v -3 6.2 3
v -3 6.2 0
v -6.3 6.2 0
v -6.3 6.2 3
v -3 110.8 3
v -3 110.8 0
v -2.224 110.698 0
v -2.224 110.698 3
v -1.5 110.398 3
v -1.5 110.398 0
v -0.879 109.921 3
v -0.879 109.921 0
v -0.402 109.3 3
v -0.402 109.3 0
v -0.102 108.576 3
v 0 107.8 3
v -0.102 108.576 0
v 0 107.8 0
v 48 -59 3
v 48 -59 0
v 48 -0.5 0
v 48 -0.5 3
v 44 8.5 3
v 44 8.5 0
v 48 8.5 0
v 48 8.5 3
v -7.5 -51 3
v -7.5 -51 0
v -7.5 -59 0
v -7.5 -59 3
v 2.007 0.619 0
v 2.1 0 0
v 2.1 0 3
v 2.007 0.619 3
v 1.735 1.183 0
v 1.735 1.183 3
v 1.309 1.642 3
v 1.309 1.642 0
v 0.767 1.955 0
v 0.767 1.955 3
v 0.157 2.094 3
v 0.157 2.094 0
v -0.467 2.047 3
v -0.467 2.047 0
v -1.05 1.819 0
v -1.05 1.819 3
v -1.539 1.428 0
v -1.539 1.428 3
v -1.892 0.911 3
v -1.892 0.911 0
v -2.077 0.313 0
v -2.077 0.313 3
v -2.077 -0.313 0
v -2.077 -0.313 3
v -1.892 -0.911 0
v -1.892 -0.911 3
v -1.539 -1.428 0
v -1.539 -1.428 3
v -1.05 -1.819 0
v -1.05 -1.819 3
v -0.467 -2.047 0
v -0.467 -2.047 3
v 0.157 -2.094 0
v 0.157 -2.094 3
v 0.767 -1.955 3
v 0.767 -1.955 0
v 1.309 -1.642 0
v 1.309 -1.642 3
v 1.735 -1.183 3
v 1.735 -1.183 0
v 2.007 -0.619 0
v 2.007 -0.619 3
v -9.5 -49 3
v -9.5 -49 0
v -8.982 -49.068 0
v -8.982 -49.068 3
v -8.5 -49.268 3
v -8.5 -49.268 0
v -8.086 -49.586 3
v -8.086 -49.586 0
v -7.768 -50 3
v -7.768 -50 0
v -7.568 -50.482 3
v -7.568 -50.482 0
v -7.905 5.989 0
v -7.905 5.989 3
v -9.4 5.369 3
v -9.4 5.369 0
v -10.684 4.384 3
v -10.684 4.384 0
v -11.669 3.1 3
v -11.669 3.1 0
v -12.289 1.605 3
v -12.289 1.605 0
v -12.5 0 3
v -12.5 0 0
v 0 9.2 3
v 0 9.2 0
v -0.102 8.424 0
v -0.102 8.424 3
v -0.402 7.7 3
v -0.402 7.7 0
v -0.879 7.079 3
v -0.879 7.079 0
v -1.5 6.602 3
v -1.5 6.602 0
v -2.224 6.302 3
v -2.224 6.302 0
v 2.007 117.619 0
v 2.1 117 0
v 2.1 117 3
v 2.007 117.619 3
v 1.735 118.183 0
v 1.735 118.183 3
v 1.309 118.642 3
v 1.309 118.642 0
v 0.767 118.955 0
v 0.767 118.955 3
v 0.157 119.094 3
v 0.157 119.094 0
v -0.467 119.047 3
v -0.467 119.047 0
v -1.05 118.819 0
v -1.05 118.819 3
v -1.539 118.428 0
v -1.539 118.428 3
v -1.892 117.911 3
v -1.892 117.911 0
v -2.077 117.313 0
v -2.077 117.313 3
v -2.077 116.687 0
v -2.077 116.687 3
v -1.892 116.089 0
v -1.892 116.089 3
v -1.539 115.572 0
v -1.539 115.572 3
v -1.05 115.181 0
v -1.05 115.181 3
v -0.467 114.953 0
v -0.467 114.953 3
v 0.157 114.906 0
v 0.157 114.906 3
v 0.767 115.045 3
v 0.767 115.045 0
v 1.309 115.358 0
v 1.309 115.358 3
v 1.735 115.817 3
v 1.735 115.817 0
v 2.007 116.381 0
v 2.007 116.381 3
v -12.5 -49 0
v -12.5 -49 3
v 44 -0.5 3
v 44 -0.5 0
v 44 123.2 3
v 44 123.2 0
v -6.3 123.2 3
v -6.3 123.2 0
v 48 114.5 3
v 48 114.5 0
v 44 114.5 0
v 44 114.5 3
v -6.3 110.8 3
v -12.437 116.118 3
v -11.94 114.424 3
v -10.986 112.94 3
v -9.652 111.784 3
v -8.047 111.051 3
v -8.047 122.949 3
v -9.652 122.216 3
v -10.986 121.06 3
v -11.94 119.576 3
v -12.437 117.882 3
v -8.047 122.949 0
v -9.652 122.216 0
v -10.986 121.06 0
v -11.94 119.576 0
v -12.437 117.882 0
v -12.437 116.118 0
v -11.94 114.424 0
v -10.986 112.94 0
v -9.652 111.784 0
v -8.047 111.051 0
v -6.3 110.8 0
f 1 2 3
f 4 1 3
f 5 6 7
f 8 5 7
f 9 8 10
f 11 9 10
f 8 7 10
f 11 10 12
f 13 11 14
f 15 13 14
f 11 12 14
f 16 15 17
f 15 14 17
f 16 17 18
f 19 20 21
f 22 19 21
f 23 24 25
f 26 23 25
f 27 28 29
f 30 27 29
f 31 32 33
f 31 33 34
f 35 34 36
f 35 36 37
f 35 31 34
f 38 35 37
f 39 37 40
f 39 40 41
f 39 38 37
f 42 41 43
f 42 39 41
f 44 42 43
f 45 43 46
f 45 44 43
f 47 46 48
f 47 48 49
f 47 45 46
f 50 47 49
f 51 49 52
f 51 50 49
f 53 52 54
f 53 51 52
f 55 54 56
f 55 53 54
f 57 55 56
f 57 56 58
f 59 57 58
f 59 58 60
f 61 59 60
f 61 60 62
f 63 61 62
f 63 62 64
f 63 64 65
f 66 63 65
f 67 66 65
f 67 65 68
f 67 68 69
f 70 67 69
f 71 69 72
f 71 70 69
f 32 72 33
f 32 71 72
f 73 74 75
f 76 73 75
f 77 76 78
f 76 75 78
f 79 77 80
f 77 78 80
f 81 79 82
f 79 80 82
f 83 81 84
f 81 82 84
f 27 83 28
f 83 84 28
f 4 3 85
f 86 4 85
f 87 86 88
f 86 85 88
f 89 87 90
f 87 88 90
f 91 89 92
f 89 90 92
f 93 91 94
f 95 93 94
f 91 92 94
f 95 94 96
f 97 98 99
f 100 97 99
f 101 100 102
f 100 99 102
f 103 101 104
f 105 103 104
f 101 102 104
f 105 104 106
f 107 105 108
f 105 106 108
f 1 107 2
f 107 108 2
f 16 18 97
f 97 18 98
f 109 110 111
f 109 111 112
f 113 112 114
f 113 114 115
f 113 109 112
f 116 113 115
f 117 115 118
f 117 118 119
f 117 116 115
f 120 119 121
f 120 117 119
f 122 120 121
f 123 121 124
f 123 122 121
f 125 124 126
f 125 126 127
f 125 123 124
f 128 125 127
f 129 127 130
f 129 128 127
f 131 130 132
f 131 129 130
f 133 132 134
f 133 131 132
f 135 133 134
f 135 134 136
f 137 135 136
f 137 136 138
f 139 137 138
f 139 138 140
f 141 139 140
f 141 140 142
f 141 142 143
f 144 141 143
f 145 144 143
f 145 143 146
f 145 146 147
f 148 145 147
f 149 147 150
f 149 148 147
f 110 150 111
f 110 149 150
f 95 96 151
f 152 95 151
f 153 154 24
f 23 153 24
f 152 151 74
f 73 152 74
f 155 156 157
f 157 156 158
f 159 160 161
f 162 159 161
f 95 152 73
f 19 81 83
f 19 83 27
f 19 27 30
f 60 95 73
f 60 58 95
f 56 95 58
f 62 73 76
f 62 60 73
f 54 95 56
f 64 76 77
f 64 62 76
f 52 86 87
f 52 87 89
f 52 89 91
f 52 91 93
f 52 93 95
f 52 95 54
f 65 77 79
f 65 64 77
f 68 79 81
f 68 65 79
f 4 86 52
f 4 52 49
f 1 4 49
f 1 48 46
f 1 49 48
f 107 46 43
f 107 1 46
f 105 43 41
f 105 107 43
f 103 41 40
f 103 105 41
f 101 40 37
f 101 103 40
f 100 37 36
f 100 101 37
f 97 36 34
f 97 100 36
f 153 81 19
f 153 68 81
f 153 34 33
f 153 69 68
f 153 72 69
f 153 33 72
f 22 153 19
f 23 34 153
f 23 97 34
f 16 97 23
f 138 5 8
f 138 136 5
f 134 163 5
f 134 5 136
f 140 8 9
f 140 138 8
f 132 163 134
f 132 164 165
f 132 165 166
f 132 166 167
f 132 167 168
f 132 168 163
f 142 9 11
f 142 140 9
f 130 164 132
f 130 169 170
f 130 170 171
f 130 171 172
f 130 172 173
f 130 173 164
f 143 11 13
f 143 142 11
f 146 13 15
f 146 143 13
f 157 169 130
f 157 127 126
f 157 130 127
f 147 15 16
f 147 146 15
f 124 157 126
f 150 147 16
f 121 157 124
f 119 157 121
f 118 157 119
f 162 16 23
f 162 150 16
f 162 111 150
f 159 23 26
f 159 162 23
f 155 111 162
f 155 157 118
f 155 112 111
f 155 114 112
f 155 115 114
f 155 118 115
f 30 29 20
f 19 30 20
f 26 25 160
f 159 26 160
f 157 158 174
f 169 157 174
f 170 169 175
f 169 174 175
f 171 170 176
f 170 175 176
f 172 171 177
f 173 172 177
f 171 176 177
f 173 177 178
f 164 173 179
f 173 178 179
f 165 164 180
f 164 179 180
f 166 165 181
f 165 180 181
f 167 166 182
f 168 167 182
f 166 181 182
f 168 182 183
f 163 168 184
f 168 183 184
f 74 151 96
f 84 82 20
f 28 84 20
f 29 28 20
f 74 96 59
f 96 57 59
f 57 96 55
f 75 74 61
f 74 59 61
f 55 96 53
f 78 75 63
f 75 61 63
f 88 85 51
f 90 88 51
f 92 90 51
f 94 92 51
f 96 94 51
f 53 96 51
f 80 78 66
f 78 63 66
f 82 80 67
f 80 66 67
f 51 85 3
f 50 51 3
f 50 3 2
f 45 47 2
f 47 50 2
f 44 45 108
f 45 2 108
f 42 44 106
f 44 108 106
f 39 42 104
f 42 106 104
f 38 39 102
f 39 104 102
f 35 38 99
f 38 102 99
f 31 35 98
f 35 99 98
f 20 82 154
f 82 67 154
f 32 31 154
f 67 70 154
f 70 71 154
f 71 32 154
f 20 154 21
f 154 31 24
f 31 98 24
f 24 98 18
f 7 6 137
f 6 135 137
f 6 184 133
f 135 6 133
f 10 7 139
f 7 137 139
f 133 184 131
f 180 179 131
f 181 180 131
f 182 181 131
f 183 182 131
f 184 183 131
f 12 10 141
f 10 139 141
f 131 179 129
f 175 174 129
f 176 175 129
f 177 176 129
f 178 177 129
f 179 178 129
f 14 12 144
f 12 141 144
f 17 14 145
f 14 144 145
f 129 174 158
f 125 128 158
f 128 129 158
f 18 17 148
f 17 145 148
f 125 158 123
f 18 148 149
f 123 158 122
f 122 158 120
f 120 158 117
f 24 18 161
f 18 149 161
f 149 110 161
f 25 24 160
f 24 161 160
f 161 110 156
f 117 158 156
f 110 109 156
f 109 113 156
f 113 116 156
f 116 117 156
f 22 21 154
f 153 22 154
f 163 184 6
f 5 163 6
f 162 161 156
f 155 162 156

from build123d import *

# Parameters (mm, degrees)
SKETCH1_R           = 2.1
BOSS_EXTRUDE1_DEPTH = 3


with BuildPart() as part:
    # Sketch1 → Boss-Extrude1 (new body)
    with BuildSketch(Plane.XY):
        with BuildLine():
            Line((-6.3, 110.8), (-3, 110.8))
            ThreePointArc((-3, 110.8), (-0.878679656, 109.921320344), (0, 107.8))
            Line((0, 107.8), (0, 9.2))
            ThreePointArc((0, 9.2), (-0.878679656, 7.078679656), (-3, 6.2))
            Line((-3, 6.2), (-6.3, 6.2))
            ThreePointArc((-6.3, 6.2), (-10.684062043, 4.384062043), (-12.5, 0))
            Line((-12.5, 0), (-12.5, -49))
            Line((-12.5, -49), (-9.5, -49))
            ThreePointArc((-9.5, -49), (-8.085786438, -49.585786438), (-7.5, -51))
            Line((-7.5, -51), (-7.5, -59))
            Line((-7.5, -59), (48, -59))
            Line((48, -59), (48, -0.5))
            Line((48, -0.5), (44, -0.5))
            Line((44, -0.5), (44, 8.5))
            Line((44, 8.5), (48, 8.5))
            Line((48, 8.5), (48, 114.5))
            Line((48, 114.5), (44, 114.5))
            Line((44, 114.5), (44, 123.2))
            Line((44, 123.2), (-6.3, 123.2))
            ThreePointArc((-6.3, 123.2), (-12.5, 117), (-6.3, 110.8))
        make_face()
        Circle(SKETCH1_R, mode=Mode.SUBTRACT)
        with Locations((0, 117)):
            Circle(SKETCH1_R, mode=Mode.SUBTRACT)
    extrude(amount=BOSS_EXTRUDE1_DEPTH)


solid = part.part
